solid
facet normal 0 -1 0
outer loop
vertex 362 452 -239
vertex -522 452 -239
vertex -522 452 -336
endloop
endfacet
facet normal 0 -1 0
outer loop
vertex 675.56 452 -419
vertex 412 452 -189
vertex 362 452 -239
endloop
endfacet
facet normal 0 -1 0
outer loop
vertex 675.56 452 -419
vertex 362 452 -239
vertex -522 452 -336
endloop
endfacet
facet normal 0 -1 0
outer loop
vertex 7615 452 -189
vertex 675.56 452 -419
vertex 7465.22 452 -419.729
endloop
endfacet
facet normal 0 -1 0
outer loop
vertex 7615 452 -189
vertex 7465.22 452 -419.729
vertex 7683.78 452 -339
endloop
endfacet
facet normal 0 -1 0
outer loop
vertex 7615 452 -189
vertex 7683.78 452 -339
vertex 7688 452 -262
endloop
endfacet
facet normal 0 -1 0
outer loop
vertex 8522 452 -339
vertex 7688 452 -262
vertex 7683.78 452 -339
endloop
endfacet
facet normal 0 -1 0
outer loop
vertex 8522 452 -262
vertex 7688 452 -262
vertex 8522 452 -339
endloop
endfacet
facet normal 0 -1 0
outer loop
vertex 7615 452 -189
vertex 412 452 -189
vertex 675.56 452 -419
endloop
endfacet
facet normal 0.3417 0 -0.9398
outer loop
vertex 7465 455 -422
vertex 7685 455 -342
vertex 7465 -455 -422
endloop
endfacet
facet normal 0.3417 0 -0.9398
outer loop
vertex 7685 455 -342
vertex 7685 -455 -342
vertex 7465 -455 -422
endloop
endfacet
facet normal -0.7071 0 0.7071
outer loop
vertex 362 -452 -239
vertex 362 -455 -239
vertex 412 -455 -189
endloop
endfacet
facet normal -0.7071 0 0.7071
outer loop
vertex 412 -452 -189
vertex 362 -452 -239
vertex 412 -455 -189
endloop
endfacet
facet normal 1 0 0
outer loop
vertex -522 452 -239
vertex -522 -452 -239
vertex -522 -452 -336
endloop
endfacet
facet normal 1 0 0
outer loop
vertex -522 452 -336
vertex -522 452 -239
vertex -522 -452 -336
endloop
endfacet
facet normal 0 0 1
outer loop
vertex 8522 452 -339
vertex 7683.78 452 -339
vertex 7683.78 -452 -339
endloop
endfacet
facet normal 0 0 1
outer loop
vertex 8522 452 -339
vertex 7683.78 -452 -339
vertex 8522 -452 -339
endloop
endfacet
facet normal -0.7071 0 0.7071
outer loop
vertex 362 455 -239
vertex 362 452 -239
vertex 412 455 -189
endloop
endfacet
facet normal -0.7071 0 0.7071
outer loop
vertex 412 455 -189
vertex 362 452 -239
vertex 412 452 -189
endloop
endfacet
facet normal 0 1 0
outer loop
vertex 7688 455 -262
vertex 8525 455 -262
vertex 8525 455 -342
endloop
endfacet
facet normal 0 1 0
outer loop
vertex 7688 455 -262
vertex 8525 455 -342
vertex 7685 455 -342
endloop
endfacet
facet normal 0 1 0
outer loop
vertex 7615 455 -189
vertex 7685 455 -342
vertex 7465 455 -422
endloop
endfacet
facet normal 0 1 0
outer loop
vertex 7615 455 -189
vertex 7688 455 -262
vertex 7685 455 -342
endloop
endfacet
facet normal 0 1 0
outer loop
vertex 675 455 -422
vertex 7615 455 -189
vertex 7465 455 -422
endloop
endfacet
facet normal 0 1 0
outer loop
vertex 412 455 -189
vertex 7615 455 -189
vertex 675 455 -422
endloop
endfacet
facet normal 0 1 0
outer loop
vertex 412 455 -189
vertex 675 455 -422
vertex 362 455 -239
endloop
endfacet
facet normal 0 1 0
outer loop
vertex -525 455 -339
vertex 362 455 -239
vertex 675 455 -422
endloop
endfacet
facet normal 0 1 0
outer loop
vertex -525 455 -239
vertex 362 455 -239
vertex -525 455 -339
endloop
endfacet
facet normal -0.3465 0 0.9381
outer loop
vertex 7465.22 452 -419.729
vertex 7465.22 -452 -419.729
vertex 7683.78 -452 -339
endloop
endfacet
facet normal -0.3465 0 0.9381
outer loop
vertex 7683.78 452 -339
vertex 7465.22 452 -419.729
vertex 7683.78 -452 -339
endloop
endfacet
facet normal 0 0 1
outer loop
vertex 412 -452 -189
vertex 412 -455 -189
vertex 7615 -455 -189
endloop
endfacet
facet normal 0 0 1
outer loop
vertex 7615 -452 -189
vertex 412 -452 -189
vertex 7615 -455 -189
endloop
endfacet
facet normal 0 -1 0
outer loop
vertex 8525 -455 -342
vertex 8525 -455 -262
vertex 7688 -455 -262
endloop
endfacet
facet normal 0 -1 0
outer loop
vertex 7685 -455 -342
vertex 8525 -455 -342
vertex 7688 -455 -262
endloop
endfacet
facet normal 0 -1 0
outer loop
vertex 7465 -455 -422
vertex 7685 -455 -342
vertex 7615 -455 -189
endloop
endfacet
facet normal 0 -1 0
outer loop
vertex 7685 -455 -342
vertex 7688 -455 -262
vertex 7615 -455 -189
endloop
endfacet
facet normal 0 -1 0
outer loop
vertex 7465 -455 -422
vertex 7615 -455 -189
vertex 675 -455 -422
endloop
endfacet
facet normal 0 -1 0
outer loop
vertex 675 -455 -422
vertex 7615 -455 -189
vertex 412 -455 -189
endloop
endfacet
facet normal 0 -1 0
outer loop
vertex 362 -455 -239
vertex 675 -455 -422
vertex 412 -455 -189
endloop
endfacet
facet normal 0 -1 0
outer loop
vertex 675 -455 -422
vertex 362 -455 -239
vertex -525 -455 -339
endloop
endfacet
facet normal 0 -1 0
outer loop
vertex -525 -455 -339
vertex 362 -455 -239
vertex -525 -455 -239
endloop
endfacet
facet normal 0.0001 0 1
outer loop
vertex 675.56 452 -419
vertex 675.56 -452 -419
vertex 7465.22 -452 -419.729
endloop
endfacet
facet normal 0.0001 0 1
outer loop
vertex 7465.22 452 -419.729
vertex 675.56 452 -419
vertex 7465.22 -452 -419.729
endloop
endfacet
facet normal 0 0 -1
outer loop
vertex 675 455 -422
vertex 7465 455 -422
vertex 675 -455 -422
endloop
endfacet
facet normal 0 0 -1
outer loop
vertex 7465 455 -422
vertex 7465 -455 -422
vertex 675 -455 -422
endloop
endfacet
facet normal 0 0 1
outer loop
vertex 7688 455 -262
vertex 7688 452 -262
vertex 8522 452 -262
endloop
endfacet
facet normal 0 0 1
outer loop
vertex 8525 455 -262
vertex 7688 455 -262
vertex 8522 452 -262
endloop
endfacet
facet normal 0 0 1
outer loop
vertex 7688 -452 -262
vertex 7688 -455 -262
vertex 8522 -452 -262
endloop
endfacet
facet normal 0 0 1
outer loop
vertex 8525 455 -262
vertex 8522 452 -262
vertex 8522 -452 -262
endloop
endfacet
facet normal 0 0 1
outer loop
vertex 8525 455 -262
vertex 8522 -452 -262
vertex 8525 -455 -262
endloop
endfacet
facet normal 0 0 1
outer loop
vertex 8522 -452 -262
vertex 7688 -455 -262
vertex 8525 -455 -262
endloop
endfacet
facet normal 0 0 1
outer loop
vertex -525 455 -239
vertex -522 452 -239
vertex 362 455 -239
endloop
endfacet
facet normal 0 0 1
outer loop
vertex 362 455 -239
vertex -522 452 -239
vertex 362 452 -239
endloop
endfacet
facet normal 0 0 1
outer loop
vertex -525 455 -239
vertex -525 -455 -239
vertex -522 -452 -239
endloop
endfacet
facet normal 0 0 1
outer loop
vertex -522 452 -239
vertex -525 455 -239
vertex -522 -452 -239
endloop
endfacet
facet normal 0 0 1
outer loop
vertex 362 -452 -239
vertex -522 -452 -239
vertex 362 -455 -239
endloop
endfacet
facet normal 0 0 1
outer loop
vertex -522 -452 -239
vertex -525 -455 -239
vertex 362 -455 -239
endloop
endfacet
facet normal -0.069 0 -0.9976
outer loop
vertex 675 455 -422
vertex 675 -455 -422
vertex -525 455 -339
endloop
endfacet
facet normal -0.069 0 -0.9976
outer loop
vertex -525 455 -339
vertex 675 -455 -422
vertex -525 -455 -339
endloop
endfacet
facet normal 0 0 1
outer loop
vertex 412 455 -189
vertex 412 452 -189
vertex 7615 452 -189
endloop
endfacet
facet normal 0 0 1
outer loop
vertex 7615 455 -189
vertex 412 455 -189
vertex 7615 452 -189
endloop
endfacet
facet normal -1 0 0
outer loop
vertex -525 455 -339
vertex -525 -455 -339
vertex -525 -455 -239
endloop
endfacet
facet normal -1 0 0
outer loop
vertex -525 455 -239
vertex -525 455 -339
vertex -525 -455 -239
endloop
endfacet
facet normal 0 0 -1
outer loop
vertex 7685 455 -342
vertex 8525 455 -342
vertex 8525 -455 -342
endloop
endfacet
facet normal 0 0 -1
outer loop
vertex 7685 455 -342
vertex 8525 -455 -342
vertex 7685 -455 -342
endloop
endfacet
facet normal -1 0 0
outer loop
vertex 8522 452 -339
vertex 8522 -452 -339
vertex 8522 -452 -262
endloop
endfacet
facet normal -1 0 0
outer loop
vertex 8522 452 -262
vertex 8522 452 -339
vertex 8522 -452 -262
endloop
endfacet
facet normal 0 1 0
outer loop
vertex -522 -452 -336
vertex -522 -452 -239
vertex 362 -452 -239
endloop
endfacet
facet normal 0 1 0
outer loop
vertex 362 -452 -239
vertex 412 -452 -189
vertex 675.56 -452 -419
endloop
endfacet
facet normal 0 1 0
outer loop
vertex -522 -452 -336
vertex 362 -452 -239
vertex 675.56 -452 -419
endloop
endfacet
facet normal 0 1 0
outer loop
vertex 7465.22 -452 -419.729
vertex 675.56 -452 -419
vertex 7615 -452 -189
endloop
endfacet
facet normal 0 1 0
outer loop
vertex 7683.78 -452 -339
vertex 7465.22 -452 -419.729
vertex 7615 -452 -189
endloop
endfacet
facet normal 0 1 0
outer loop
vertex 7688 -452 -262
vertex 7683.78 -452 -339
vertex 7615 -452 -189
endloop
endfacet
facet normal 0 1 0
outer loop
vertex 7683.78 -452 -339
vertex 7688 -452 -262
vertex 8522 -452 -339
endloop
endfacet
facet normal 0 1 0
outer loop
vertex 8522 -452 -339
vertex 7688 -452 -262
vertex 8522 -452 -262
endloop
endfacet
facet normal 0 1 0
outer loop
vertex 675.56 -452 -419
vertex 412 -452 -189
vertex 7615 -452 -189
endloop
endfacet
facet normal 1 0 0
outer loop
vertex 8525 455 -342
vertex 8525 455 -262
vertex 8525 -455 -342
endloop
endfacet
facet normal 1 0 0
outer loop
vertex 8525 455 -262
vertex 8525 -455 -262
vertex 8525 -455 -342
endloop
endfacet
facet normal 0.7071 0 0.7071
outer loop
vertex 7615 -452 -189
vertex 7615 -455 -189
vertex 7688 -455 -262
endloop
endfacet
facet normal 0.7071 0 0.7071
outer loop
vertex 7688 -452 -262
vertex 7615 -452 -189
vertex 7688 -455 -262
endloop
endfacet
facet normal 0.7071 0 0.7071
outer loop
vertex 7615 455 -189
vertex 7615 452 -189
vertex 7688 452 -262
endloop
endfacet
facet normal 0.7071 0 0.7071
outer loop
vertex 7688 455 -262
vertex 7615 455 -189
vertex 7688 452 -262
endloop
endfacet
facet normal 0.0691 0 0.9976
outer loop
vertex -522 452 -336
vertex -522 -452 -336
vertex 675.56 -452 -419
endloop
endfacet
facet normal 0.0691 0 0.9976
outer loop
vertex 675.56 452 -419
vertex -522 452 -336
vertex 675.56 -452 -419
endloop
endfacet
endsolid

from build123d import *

# Parameters (mm, degrees)
EXTRUDE031_DEPTH = 452
EXTRUDE027_DEPTH = 455


with BuildPart() as extrude031:
    # Sketch042 → Extrude031 (new body, symmetric)
    with BuildSketch(Plane.XZ):
        Polygon((-522, -59), (-522, -336), (675.559692, -419), (7465.22, -419.729309), (7683.78, -339), (8522, -339), (8522, -59), align=None)
    extrude(amount=EXTRUDE031_DEPTH, both=True)


with BuildPart() as cut005:
    # Sketch029 → Extrude027 (new body, symmetric)
    with BuildSketch(Plane.XZ):
        Polygon((-525, -239), (362, -239), (412, -189), (7615, -189), (7688, -262), (8525, -262), (8525, -342), (7685, -342), (7465, -422), (675, -422), (-525, -339), align=None)
    extrude(amount=EXTRUDE027_DEPTH, both=True)

    # Cut005: cut Extrude031
    add(extrude031.part, mode=Mode.SUBTRACT)


solid = cut005.part
